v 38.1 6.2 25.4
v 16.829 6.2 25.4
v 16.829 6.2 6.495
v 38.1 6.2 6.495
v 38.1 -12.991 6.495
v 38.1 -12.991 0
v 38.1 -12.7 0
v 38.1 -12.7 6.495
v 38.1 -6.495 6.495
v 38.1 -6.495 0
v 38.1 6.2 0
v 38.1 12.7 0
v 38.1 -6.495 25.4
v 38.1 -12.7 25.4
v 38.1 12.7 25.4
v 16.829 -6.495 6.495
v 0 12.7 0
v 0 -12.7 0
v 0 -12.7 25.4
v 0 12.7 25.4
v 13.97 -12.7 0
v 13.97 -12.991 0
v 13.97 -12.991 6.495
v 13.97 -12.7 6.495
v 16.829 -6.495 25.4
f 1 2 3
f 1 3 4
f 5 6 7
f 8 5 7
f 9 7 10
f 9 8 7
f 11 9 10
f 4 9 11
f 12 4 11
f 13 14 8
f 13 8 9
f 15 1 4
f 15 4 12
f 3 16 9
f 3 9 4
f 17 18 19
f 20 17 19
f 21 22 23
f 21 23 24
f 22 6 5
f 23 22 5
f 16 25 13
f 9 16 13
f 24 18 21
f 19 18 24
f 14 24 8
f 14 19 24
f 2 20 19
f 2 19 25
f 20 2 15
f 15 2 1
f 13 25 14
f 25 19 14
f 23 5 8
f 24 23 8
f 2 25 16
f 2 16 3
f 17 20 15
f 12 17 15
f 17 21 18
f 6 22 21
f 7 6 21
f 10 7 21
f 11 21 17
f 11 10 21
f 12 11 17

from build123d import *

# Parameters (mm, degrees)
F0_W     = 38.1
F0_H     = 25.4
F1_DEPTH = 12.7
F2_W     = 21.2713289022
F2_H     = 12.695313897
F3_DEPTH = 25.4
F4_W     = 25.6905510694
F4_H     = 6.4952769317
F5_DEPTH = 24.13


with BuildPart() as f1:
    # F0 (on Front) → F1 (new body, symmetric)
    with BuildSketch(Plane.XZ):
        with Locations((19.05, 12.7)):
            Rectangle(F0_W, F0_H)
    extrude(amount=F1_DEPTH, both=True)

    # F2 (on face) → F3 (cut)
    with BuildSketch(Plane.XY.offset(25.4)):
        with Locations((27.4643355489, -0.1476199832)):
            Rectangle(F2_W, F2_H)
    extrude(amount=-F3_DEPTH, mode=Mode.SUBTRACT)

    # F4 (on face) → F5 (join)
    with BuildSketch(Plane.YZ.offset(38.1)):
        with Locations((-0.1452755347, 3.2476384658)):
            Rectangle(F4_W, F4_H)
    extrude(amount=-F5_DEPTH)


solid = f1.part
